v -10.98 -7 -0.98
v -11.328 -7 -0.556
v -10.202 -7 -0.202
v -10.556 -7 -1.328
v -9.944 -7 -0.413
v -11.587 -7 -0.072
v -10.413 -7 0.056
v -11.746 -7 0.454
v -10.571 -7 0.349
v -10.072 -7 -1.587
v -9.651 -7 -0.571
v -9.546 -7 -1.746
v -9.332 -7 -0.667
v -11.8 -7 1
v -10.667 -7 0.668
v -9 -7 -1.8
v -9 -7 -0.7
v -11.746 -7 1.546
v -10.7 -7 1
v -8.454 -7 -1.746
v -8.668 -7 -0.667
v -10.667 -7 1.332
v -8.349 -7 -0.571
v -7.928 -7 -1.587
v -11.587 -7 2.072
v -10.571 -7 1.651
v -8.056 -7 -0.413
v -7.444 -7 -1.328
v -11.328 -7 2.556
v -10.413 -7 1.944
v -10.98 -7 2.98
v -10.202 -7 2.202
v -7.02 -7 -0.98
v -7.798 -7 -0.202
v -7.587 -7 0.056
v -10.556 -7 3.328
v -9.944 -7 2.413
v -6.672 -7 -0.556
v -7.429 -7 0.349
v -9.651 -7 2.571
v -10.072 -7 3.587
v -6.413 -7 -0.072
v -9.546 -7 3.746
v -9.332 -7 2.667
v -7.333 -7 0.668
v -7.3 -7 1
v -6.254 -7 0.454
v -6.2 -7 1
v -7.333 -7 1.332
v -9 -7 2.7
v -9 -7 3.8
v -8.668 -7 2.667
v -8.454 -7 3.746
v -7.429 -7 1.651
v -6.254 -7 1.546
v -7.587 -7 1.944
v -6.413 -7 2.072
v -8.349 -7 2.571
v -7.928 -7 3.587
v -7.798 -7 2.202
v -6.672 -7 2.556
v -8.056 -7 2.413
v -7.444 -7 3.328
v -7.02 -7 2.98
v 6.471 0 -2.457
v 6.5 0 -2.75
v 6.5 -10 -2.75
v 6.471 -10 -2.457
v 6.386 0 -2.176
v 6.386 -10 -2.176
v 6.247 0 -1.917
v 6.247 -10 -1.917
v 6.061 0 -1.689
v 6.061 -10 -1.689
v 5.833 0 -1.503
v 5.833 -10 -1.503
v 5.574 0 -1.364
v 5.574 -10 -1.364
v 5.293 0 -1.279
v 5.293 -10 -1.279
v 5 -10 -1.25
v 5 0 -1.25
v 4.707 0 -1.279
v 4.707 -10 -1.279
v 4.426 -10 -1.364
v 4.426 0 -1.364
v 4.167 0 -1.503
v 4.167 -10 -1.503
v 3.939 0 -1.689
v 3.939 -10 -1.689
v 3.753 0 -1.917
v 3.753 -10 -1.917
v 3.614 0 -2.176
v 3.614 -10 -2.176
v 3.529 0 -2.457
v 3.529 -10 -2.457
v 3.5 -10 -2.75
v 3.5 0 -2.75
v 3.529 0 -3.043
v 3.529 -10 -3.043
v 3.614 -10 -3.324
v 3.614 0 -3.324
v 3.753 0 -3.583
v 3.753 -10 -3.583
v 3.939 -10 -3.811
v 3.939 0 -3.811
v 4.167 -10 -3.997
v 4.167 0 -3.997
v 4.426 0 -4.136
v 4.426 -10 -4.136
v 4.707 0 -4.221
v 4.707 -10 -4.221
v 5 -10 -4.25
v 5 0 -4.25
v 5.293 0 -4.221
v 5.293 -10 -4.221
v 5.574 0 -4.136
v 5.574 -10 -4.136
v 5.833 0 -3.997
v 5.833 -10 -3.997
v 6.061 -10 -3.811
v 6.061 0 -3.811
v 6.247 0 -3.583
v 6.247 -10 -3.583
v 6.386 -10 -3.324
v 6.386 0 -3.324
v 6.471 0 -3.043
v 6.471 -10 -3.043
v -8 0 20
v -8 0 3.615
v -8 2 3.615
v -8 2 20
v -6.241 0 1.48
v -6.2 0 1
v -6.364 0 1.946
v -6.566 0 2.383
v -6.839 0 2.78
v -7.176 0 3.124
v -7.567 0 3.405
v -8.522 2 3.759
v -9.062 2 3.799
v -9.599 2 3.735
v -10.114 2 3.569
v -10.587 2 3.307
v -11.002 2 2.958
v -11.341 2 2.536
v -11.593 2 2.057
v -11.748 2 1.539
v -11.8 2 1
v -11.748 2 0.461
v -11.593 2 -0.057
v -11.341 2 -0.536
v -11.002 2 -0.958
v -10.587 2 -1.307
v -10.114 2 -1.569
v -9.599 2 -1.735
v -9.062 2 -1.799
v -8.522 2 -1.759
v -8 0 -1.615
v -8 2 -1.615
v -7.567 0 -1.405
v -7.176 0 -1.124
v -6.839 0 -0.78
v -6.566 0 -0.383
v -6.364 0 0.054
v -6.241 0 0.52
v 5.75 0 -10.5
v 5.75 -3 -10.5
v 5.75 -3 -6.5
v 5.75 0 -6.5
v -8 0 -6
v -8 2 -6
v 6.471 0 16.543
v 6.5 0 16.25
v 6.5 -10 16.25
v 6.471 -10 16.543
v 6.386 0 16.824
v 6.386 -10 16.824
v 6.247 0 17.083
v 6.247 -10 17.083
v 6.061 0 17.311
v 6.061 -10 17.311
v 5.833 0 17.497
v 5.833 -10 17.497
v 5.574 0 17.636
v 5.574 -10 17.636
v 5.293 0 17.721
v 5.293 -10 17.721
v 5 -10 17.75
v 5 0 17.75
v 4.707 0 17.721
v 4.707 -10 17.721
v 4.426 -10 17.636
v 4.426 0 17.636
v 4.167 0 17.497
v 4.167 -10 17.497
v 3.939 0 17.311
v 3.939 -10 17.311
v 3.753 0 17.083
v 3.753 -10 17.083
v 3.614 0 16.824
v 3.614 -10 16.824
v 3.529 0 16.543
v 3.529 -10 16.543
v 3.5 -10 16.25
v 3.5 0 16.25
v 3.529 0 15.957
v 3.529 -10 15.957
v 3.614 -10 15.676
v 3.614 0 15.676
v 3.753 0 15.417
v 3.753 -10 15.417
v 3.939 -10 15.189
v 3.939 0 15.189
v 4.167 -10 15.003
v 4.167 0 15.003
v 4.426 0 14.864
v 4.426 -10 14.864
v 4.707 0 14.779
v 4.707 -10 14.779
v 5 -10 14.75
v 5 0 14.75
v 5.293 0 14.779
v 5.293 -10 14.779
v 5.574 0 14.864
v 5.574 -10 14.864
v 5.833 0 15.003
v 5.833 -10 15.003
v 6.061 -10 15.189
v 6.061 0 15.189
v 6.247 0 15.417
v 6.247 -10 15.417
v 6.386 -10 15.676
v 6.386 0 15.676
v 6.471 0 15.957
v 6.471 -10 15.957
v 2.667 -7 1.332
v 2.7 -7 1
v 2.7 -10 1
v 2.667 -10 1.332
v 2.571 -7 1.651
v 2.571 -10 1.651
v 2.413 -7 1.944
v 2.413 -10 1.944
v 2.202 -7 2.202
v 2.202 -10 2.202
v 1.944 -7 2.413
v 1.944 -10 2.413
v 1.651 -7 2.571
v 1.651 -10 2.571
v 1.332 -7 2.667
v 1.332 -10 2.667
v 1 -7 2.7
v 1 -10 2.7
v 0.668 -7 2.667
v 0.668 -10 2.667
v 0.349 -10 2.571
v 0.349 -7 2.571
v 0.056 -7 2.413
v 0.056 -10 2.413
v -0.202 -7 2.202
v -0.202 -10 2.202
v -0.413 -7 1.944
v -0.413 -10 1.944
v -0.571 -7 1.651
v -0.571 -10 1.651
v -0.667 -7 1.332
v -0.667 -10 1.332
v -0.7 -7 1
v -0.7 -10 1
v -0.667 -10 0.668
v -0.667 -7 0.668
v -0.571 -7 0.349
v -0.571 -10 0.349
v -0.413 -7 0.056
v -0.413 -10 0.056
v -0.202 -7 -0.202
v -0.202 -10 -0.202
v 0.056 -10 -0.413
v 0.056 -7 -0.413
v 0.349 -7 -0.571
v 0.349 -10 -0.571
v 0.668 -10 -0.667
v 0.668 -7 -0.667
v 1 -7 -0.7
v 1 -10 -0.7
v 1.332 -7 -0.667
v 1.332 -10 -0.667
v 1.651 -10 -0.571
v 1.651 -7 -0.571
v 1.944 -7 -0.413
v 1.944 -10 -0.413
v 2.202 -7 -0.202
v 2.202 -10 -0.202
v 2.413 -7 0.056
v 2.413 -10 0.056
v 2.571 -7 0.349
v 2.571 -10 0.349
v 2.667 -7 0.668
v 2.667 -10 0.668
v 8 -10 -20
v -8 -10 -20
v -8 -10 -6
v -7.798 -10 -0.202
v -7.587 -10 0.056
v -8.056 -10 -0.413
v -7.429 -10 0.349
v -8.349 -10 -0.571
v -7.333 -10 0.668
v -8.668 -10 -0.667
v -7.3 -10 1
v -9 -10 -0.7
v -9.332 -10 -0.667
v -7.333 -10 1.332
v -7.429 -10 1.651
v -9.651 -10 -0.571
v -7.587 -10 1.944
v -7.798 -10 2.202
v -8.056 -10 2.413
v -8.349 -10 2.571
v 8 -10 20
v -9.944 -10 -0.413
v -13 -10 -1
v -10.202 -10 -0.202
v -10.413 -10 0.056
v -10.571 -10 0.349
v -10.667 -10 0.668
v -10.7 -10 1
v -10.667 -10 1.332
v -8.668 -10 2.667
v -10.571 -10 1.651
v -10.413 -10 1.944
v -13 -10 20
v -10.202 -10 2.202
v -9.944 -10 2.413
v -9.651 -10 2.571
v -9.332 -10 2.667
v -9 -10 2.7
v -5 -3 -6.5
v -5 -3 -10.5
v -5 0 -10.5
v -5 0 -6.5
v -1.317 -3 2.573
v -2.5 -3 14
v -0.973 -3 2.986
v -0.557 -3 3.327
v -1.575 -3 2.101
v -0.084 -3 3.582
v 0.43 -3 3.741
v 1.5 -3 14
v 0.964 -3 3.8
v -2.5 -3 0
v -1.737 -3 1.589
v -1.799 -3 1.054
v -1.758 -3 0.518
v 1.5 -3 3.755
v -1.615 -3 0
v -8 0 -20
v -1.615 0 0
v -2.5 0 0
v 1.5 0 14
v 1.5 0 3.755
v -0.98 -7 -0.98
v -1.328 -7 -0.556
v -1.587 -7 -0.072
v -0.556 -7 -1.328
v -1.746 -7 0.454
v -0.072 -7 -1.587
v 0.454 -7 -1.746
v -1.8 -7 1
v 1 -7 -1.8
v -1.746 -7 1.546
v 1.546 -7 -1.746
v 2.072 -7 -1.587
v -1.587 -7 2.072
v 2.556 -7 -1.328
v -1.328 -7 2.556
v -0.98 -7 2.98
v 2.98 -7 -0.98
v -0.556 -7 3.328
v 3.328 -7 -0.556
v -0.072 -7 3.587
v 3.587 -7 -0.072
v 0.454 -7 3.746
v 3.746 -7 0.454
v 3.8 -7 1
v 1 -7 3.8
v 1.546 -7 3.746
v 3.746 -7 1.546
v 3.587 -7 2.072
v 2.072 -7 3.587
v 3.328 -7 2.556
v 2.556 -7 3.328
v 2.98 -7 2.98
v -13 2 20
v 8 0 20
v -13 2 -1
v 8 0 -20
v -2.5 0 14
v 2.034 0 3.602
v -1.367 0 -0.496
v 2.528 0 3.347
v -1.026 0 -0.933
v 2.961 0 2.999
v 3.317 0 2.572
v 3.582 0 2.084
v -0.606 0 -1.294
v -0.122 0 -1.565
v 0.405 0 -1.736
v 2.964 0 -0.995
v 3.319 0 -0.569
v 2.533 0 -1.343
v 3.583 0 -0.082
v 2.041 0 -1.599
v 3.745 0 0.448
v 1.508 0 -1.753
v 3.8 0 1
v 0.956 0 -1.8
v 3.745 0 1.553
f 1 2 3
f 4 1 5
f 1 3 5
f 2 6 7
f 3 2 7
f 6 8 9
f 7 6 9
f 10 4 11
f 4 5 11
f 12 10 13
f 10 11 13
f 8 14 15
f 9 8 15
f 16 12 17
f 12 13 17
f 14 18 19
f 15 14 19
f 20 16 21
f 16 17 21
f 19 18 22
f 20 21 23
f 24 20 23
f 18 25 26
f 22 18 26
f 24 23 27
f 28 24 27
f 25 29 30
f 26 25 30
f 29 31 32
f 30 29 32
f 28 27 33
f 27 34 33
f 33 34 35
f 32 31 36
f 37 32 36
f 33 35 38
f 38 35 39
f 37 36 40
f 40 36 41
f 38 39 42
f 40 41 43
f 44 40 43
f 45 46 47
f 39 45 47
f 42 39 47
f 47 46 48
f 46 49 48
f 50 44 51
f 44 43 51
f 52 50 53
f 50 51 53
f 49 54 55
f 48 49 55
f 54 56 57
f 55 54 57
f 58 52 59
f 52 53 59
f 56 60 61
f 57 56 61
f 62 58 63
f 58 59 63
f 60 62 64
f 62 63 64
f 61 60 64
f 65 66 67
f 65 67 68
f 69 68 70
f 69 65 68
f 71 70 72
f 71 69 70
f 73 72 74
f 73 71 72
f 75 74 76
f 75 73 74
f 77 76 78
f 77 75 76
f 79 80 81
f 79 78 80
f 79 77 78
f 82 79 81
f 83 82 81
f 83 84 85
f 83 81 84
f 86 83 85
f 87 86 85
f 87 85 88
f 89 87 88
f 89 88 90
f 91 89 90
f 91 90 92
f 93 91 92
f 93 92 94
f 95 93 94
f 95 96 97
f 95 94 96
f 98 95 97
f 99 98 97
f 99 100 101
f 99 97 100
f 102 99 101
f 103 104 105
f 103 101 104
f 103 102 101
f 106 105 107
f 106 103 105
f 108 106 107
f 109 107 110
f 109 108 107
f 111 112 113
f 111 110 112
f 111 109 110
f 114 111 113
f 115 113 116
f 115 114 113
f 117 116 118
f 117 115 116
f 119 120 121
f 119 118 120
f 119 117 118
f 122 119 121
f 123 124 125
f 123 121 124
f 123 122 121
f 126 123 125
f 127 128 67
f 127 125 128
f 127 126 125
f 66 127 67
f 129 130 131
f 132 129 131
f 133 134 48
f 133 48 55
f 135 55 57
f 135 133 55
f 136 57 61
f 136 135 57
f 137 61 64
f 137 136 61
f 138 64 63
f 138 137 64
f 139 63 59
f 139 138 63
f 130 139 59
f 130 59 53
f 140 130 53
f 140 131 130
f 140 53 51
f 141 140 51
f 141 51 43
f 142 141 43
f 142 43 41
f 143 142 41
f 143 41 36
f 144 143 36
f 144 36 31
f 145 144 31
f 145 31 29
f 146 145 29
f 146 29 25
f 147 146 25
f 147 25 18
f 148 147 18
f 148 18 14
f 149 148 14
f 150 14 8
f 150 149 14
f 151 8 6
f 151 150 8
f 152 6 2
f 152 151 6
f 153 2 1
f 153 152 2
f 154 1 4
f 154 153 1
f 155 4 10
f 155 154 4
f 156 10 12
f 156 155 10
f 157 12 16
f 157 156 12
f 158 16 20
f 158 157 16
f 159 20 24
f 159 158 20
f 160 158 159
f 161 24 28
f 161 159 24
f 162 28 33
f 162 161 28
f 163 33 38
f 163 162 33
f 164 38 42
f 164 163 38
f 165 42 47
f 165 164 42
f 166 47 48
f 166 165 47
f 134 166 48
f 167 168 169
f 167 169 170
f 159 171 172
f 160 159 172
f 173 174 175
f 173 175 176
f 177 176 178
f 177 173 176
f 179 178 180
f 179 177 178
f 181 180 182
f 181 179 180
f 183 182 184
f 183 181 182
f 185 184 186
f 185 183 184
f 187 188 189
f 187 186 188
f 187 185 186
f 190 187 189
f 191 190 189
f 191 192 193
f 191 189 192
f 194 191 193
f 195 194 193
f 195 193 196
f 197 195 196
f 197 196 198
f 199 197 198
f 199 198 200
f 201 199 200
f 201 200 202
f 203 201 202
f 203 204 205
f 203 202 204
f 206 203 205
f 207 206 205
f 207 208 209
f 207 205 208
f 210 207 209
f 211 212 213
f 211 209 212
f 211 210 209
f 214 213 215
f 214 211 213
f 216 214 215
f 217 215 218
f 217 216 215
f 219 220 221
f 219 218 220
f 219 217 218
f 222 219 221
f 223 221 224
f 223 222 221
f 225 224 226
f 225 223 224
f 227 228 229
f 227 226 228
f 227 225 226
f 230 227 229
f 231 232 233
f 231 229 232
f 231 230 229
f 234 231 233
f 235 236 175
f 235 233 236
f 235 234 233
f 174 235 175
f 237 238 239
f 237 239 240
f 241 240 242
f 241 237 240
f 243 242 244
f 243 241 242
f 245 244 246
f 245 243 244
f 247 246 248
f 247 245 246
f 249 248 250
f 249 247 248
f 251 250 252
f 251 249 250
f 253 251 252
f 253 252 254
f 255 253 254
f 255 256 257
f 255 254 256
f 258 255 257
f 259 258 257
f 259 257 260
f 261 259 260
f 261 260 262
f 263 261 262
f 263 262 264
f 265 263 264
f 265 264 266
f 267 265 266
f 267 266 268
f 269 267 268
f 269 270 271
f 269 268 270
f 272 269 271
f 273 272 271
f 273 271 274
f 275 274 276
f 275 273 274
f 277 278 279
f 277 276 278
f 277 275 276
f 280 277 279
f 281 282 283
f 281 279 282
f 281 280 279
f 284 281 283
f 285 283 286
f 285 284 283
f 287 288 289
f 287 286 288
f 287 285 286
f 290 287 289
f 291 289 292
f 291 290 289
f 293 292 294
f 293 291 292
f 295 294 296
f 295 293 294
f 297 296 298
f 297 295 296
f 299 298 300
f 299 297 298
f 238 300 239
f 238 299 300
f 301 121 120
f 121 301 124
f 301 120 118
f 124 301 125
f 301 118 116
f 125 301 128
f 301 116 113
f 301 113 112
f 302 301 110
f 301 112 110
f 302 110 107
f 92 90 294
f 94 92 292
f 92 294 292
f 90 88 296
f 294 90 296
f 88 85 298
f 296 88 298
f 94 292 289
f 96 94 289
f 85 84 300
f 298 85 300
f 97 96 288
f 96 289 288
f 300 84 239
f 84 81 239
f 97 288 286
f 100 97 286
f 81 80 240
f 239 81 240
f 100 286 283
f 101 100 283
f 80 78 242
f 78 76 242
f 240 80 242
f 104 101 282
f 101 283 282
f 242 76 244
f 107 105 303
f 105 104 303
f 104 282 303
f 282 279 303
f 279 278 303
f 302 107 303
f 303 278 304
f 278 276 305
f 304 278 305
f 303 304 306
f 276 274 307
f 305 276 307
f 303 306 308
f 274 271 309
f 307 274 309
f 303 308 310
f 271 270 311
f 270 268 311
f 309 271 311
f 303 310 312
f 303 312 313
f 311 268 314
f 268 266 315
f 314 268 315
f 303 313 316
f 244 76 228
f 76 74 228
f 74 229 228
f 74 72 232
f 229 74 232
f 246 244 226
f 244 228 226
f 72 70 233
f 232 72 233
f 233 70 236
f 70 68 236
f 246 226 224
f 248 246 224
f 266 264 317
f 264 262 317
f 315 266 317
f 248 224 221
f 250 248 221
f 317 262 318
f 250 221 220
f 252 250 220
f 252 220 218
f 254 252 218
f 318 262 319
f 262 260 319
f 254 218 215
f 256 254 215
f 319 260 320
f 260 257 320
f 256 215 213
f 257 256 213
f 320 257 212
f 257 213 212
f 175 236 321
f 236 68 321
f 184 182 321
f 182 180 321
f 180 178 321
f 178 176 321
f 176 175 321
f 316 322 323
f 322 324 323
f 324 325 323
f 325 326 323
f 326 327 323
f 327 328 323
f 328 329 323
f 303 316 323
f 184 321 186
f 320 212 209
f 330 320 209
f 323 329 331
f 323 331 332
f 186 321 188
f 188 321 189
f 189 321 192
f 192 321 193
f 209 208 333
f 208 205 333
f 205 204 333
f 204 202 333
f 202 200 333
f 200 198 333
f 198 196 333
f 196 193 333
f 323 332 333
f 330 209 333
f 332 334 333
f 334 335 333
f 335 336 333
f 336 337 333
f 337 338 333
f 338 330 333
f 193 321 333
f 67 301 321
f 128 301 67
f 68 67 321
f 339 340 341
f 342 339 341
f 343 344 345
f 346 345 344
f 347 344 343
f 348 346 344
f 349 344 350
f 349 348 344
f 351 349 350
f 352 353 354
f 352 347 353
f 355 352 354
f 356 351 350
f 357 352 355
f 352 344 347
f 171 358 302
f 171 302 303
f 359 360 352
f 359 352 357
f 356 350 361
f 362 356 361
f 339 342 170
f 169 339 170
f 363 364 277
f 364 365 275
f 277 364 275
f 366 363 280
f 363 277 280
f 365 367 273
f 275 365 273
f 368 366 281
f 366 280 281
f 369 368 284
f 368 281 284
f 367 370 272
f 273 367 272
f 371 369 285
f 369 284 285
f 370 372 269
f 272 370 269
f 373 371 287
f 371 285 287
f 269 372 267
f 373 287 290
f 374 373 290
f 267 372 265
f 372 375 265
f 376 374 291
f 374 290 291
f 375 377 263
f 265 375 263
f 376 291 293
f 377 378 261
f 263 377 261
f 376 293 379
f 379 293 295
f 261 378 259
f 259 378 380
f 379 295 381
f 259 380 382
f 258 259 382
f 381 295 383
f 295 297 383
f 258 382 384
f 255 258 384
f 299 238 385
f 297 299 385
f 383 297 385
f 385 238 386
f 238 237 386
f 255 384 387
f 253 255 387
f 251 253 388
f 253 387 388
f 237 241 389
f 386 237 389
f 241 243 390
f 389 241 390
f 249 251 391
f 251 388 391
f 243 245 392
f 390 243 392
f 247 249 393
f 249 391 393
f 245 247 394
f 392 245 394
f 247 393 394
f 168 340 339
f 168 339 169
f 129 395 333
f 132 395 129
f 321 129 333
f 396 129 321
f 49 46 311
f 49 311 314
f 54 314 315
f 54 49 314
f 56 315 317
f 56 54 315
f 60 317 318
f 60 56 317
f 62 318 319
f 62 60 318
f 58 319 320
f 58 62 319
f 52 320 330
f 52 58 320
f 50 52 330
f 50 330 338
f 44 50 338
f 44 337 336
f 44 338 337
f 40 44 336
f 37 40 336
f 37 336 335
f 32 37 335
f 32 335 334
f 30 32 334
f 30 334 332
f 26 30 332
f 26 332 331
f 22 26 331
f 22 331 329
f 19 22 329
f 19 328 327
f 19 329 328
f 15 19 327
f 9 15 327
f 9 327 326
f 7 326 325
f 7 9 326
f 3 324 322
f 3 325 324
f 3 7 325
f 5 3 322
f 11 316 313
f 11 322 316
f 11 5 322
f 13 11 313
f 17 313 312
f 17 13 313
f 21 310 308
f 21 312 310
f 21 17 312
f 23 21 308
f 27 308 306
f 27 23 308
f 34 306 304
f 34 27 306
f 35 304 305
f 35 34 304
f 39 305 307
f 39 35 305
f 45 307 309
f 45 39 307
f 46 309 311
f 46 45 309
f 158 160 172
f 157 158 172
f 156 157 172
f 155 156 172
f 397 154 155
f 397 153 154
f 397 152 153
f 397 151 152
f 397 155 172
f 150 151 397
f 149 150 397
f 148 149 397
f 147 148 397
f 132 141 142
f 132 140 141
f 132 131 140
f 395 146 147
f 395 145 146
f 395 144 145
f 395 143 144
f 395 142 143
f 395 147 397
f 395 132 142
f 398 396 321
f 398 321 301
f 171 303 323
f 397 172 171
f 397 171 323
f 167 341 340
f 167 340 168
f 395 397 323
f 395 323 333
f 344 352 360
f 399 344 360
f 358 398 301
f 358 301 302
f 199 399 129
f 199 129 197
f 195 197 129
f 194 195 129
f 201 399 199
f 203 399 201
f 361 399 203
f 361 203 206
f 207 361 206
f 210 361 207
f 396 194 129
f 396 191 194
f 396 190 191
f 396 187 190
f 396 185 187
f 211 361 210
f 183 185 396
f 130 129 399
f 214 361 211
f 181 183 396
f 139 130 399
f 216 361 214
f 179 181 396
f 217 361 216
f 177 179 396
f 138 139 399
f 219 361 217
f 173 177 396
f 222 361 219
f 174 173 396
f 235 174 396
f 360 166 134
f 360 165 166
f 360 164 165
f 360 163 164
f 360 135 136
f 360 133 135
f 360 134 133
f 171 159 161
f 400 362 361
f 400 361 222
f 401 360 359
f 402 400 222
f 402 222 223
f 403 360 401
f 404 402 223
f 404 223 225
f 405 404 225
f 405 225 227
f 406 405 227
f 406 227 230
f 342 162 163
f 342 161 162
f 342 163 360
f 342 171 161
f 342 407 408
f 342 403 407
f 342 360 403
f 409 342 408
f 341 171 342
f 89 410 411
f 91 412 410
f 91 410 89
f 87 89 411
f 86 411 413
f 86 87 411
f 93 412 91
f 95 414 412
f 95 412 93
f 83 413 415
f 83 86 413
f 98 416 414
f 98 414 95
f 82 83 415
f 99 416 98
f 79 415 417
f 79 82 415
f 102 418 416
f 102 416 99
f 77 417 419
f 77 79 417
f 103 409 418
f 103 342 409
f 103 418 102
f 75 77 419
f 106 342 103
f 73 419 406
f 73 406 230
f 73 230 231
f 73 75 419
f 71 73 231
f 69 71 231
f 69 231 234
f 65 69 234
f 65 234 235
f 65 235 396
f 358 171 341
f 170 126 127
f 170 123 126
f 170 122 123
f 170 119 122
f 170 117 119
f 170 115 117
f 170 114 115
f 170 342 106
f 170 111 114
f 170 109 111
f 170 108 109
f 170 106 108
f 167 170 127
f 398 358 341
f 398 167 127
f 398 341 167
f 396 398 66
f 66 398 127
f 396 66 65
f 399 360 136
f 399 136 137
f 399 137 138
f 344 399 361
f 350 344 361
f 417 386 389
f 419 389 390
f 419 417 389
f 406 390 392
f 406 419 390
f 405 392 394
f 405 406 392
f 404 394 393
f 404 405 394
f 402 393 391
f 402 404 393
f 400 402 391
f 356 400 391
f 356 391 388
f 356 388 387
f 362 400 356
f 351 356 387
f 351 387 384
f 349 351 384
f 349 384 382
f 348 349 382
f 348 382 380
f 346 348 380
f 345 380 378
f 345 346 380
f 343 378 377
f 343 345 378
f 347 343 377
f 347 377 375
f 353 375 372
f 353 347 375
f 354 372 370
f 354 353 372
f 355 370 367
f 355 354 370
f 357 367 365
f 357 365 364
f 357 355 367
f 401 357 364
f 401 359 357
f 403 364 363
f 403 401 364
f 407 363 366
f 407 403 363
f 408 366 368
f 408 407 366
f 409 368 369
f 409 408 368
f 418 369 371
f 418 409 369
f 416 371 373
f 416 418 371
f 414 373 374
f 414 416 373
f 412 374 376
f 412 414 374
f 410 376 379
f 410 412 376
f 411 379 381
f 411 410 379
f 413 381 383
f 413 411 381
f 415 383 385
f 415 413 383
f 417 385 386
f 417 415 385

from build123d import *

# Parameters (mm, degrees)
BOX025_W               = 20
BOX025_H               = 10
BOX025_DEPTH           = 44
BOX027_W               = 10.75
BOX027_H               = 10
BOX027_DEPTH           = 4
BOX026_W               = 4
BOX026_H               = 10
BOX026_DEPTH           = 14
CYLINDER031_R          = 2.8
CYLINDER031_DEPTH      = 22
CYLINDER031_ROLL_ANGLE = 90
CYLINDER027_R          = 1.5
CYLINDER027_DEPTH      = 22
CYLINDER027_ROLL_ANGLE = 90
CYLINDER029_R          = 1.5
CYLINDER029_DEPTH      = 22
CYLINDER029_ROLL_ANGLE = 90
CYLINDER026_R          = 1.7
CYLINDER026_DEPTH      = 22
CYLINDER026_ROLL_ANGLE = 90
CYLINDER028_R          = 1.7
CYLINDER028_DEPTH      = 22
CYLINDER028_ROLL_ANGLE = 90
CYLINDER030_R          = 2.8
CYLINDER030_DEPTH      = 22
CYLINDER030_ROLL_ANGLE = 90
PAD016_DEPTH           = 12


with BuildPart() as cube025:
    # Box025 → Box025 (new body)
    with BuildSketch(Plane(origin=(-8, 0, -22), x_dir=(1, 0, 0), z_dir=(0, 0, 1))):
        with Locations((10, 5)):
            Rectangle(BOX025_W, BOX025_H)
    extrude(amount=BOX025_DEPTH)


with BuildPart() as cube027:
    # Box027 → Box027 (new body)
    with BuildSketch(Plane(origin=(-5, -3, -10.5), x_dir=(1, 0, 0), z_dir=(0, 0, 1))):
        with Locations((5.375, 5)):
            Rectangle(BOX027_W, BOX027_H)
    extrude(amount=BOX027_DEPTH)


with BuildPart() as fusion025:
    # Box026 → Box026 (new body)
    with BuildSketch(Plane(origin=(-2.5, -3, 0), x_dir=(1, 0, 0), z_dir=(0, 0, 1))):
        with Locations((2, 5)):
            Rectangle(BOX026_W, BOX026_H)
    extrude(amount=BOX026_DEPTH)

    # Fusion025: union Cube027
    add(cube027.part)


with BuildPart() as cylinder031:
    # Cylinder031 → Cylinder031 (new body)
    with BuildSketch(Plane.XY):
        Circle(CYLINDER031_R)
    extrude(amount=CYLINDER031_DEPTH)


with BuildPart() as cylinder031_1:
    # Cylinder031 roll: moved
    add(cylinder031.part.rotate(Axis((0, 0, 0), (1, 0, 0)), CYLINDER031_ROLL_ANGLE))


with BuildPart() as cylinder031_2:
    # Cylinder031 placement: moved
    add(cylinder031_1.part.moved(Location((-9, 15, 1))))


with BuildPart() as cylinder027:
    # Cylinder027 → Cylinder027 (new body)
    with BuildSketch(Plane.XY):
        Circle(CYLINDER027_R)
    extrude(amount=CYLINDER027_DEPTH)


with BuildPart() as cylinder027_1:
    # Cylinder027 roll: moved
    add(cylinder027.part.rotate(Axis((0, 0, 0), (1, 0, 0)), CYLINDER027_ROLL_ANGLE))


with BuildPart() as cylinder027_2:
    # Cylinder027 placement: moved
    add(cylinder027_1.part.moved(Location((5, 6, 16.25))))


with BuildPart() as cylinder029:
    # Cylinder029 → Cylinder029 (new body)
    with BuildSketch(Plane.XY):
        Circle(CYLINDER029_R)
    extrude(amount=CYLINDER029_DEPTH)


with BuildPart() as cylinder029_1:
    # Cylinder029 roll: moved
    add(cylinder029.part.rotate(Axis((0, 0, 0), (1, 0, 0)), CYLINDER029_ROLL_ANGLE))


with BuildPart() as cylinder029_2:
    # Cylinder029 placement: moved
    add(cylinder029_1.part.moved(Location((5, 6, -2.75))))


with BuildPart() as cylinder026:
    # Cylinder026 → Cylinder026 (new body)
    with BuildSketch(Plane.XY):
        Circle(CYLINDER026_R)
    extrude(amount=CYLINDER026_DEPTH)


with BuildPart() as cylinder026_1:
    # Cylinder026 roll: moved
    add(cylinder026.part.rotate(Axis((0, 0, 0), (1, 0, 0)), CYLINDER026_ROLL_ANGLE))


with BuildPart() as cylinder026_2:
    # Cylinder026 placement: moved
    add(cylinder026_1.part.moved(Location((-9, 6, 1))))


with BuildPart() as cylinder028:
    # Cylinder028 → Cylinder028 (new body)
    with BuildSketch(Plane.XY):
        Circle(CYLINDER028_R)
    extrude(amount=CYLINDER028_DEPTH)


with BuildPart() as cylinder028_1:
    # Cylinder028 roll: moved
    add(cylinder028.part.rotate(Axis((0, 0, 0), (1, 0, 0)), CYLINDER028_ROLL_ANGLE))


with BuildPart() as cylinder028_2:
    # Cylinder028 placement: moved
    add(cylinder028_1.part.moved(Location((1, 6, 1))))


with BuildPart() as fusion024:
    # Cylinder030 → Cylinder030 (new body)
    with BuildSketch(Plane.XY):
        Circle(CYLINDER030_R)
    extrude(amount=CYLINDER030_DEPTH)


with BuildPart() as fusion024_1:
    # Cylinder030 roll: moved
    add(fusion024.part.rotate(Axis((0, 0, 0), (1, 0, 0)), CYLINDER030_ROLL_ANGLE))


with BuildPart() as fusion024_2:
    # Cylinder030 placement: moved
    add(fusion024_1.part.moved(Location((1, 15, 1))))

    # Fusion024: union Cylinder031, Cylinder027, Cylinder029, Cylinder026, Cylinder028
    add(cylinder031_2.part)
    add(cylinder027_2.part)
    add(cylinder029_2.part)
    add(cylinder026_2.part)
    add(cylinder028_2.part)


with BuildPart() as cut036:
    # Sketch018 → Pad016 (new body)
    with BuildSketch(Plane.XZ.offset(-2)):
        Polygon((-13, 20), (8, 20), (8, -20), (-8, -20), (-8, -6), (-13, -1), align=None)
    extrude(amount=PAD016_DEPTH)

    # Cut034: cut Fusion024
    add(fusion024_2.part, mode=Mode.SUBTRACT)

    # Cut035: cut Fusion025
    add(fusion025.part, mode=Mode.SUBTRACT)

    # Cut036: cut Cube025
    add(cube025.part, mode=Mode.SUBTRACT)


solid = cut036.part
